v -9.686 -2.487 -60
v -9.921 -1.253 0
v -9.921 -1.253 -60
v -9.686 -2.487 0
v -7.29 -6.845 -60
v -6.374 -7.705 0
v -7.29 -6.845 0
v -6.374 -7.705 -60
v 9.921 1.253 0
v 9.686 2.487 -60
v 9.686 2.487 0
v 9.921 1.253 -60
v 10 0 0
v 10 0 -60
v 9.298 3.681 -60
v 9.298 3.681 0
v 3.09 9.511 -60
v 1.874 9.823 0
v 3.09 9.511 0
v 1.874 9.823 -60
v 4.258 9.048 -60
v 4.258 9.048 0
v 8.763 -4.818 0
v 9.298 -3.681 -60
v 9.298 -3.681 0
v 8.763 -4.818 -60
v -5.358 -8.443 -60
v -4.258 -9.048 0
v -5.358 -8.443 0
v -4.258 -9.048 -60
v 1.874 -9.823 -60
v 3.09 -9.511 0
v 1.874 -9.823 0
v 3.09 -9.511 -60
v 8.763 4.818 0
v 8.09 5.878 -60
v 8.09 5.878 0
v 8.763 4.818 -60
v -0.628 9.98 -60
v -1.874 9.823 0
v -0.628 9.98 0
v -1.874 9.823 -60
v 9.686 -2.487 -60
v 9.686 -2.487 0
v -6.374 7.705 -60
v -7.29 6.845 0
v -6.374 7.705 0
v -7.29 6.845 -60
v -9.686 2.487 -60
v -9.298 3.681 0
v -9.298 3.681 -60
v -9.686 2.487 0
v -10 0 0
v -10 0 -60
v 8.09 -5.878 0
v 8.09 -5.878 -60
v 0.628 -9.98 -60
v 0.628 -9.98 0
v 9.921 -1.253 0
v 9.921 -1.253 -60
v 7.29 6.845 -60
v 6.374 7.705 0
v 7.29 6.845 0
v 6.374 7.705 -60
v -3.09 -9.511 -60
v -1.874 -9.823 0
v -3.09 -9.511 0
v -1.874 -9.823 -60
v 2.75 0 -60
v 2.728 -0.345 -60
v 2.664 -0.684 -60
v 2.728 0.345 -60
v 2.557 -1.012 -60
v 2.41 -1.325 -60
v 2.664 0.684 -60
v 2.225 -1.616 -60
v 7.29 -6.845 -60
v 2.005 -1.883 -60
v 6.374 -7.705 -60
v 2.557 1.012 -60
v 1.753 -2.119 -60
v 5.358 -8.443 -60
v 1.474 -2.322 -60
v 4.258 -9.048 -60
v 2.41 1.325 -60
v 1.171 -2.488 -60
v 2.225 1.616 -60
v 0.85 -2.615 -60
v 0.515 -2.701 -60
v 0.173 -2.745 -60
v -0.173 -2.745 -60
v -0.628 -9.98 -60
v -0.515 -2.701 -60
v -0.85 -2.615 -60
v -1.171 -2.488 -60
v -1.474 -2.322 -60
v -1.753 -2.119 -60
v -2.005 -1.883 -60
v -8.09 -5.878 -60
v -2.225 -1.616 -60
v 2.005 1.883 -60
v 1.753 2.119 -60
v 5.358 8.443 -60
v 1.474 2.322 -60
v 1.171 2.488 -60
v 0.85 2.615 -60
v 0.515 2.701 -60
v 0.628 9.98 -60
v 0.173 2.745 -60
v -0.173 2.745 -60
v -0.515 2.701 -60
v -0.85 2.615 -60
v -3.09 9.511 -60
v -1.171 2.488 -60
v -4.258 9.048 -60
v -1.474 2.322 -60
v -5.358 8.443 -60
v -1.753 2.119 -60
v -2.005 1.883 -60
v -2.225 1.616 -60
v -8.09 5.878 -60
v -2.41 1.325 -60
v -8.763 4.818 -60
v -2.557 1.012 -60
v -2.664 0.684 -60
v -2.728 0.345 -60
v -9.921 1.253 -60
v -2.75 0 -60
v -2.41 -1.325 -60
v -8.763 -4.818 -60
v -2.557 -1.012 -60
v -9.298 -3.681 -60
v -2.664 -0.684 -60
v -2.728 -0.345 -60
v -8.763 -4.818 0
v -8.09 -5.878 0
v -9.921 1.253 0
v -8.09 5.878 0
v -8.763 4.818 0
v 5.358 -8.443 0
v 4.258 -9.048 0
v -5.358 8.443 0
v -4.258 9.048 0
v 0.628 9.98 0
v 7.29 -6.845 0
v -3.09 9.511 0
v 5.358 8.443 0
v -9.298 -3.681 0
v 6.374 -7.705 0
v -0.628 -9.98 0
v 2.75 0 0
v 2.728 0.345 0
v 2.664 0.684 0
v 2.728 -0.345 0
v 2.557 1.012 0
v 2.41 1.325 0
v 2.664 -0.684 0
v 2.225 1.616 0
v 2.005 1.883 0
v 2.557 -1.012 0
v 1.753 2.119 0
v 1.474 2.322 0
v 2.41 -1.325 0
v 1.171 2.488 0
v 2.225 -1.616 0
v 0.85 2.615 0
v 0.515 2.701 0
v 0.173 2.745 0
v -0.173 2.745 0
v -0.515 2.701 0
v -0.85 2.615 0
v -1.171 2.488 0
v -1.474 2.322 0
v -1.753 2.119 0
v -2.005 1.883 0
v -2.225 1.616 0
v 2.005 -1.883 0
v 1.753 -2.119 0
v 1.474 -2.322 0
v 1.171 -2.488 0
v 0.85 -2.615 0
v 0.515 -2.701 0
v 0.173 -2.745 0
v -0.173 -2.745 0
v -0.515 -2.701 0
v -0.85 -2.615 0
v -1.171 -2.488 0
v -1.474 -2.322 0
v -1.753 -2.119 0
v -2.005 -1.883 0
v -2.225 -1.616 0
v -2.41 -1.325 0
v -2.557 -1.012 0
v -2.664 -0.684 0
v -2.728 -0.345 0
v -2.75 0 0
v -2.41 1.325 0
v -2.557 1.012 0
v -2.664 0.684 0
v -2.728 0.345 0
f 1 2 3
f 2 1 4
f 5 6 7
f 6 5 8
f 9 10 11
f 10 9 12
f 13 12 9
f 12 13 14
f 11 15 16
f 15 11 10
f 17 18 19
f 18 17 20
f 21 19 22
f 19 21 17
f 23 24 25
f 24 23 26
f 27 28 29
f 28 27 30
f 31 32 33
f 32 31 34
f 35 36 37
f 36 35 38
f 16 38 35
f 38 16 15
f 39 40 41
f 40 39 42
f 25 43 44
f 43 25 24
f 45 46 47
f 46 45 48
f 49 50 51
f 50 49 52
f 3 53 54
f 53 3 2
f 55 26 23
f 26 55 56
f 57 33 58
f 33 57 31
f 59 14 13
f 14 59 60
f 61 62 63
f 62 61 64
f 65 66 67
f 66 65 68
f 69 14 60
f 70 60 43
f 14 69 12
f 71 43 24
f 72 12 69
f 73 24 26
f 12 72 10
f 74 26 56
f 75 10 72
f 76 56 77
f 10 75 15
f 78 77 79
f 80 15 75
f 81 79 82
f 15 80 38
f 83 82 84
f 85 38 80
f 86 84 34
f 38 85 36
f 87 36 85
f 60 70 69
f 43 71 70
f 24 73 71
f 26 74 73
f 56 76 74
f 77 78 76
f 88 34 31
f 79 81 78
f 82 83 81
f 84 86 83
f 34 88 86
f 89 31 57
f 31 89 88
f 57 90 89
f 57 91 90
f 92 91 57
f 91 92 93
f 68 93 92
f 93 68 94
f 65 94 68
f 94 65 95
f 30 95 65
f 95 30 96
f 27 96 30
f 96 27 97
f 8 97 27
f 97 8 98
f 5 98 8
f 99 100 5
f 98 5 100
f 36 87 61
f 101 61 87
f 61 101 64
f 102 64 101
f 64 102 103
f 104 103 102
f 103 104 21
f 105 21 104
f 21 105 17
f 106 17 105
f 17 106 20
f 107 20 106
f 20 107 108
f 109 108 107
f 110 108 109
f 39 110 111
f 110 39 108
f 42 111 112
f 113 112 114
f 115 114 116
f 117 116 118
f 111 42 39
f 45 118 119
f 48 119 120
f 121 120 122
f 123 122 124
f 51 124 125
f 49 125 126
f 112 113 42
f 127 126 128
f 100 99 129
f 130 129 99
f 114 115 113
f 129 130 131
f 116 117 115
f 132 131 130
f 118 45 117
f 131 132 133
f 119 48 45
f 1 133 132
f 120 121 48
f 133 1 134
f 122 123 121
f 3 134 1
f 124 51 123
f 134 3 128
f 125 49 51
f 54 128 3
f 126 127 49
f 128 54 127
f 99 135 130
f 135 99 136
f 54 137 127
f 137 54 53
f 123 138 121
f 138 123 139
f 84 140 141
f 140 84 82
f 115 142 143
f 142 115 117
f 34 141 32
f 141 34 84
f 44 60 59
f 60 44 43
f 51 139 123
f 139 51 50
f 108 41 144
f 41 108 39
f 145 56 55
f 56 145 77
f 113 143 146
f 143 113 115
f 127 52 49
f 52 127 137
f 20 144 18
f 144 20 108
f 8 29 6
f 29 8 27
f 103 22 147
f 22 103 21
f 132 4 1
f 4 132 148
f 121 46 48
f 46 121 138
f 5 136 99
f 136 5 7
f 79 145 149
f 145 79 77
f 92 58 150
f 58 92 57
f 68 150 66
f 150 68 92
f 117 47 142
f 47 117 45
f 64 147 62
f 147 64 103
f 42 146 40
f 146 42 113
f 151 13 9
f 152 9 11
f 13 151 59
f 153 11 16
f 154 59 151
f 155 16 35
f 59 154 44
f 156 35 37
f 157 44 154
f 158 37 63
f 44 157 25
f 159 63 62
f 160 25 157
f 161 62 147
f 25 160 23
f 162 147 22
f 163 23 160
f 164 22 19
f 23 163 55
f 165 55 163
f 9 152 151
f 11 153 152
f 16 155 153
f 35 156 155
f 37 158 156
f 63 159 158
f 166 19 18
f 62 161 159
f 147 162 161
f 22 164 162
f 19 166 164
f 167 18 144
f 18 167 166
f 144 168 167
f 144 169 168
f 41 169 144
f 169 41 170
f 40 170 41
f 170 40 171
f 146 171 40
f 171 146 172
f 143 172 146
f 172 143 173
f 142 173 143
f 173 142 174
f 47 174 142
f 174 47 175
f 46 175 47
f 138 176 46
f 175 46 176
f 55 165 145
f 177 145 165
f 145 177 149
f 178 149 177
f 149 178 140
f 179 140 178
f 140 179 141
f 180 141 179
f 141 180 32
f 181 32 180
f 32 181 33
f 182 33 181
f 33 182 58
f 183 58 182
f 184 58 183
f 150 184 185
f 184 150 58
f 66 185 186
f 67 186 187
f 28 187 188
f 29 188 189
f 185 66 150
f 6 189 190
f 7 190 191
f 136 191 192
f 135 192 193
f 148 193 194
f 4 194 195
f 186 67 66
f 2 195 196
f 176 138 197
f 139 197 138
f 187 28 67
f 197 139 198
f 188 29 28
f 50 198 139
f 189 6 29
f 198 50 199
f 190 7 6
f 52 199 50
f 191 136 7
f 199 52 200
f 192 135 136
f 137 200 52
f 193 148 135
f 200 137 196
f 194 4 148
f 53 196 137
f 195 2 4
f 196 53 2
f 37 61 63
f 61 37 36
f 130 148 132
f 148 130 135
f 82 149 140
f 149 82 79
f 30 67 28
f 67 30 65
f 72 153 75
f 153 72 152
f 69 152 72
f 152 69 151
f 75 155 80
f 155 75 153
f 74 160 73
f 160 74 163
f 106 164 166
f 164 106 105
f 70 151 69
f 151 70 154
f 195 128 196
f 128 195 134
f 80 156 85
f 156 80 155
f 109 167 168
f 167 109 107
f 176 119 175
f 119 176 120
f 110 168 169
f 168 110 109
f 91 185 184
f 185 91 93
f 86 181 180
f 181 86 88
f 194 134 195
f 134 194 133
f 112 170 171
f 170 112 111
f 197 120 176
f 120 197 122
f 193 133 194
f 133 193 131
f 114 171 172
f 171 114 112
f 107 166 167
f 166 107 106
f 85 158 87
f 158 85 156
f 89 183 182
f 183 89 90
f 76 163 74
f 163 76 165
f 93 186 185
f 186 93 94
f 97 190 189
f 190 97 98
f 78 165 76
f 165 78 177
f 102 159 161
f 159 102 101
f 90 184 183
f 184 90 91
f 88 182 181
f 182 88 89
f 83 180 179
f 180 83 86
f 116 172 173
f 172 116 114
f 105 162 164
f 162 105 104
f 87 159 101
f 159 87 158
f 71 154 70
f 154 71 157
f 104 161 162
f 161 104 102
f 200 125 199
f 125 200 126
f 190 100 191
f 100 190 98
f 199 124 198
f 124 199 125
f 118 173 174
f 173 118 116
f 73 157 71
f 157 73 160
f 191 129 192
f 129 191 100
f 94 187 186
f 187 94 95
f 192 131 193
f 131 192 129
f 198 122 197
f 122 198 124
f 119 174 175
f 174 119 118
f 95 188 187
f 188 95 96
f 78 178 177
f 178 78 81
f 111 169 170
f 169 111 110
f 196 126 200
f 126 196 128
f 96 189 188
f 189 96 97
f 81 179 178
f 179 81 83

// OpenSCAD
$fn = 50;


difference() {
	union() {
		translate(v = [0, 0, -60.0000000000]) {
			cylinder(h = 60, r = 10.0000000000);
		}
		cylinder(h = 0, r = 16.0000000000);
	}
	union() {
		#translate(v = [0, 0, -60]) {
			cylinder(h = 60, r = 2.7500000000);
		}
	}
}
